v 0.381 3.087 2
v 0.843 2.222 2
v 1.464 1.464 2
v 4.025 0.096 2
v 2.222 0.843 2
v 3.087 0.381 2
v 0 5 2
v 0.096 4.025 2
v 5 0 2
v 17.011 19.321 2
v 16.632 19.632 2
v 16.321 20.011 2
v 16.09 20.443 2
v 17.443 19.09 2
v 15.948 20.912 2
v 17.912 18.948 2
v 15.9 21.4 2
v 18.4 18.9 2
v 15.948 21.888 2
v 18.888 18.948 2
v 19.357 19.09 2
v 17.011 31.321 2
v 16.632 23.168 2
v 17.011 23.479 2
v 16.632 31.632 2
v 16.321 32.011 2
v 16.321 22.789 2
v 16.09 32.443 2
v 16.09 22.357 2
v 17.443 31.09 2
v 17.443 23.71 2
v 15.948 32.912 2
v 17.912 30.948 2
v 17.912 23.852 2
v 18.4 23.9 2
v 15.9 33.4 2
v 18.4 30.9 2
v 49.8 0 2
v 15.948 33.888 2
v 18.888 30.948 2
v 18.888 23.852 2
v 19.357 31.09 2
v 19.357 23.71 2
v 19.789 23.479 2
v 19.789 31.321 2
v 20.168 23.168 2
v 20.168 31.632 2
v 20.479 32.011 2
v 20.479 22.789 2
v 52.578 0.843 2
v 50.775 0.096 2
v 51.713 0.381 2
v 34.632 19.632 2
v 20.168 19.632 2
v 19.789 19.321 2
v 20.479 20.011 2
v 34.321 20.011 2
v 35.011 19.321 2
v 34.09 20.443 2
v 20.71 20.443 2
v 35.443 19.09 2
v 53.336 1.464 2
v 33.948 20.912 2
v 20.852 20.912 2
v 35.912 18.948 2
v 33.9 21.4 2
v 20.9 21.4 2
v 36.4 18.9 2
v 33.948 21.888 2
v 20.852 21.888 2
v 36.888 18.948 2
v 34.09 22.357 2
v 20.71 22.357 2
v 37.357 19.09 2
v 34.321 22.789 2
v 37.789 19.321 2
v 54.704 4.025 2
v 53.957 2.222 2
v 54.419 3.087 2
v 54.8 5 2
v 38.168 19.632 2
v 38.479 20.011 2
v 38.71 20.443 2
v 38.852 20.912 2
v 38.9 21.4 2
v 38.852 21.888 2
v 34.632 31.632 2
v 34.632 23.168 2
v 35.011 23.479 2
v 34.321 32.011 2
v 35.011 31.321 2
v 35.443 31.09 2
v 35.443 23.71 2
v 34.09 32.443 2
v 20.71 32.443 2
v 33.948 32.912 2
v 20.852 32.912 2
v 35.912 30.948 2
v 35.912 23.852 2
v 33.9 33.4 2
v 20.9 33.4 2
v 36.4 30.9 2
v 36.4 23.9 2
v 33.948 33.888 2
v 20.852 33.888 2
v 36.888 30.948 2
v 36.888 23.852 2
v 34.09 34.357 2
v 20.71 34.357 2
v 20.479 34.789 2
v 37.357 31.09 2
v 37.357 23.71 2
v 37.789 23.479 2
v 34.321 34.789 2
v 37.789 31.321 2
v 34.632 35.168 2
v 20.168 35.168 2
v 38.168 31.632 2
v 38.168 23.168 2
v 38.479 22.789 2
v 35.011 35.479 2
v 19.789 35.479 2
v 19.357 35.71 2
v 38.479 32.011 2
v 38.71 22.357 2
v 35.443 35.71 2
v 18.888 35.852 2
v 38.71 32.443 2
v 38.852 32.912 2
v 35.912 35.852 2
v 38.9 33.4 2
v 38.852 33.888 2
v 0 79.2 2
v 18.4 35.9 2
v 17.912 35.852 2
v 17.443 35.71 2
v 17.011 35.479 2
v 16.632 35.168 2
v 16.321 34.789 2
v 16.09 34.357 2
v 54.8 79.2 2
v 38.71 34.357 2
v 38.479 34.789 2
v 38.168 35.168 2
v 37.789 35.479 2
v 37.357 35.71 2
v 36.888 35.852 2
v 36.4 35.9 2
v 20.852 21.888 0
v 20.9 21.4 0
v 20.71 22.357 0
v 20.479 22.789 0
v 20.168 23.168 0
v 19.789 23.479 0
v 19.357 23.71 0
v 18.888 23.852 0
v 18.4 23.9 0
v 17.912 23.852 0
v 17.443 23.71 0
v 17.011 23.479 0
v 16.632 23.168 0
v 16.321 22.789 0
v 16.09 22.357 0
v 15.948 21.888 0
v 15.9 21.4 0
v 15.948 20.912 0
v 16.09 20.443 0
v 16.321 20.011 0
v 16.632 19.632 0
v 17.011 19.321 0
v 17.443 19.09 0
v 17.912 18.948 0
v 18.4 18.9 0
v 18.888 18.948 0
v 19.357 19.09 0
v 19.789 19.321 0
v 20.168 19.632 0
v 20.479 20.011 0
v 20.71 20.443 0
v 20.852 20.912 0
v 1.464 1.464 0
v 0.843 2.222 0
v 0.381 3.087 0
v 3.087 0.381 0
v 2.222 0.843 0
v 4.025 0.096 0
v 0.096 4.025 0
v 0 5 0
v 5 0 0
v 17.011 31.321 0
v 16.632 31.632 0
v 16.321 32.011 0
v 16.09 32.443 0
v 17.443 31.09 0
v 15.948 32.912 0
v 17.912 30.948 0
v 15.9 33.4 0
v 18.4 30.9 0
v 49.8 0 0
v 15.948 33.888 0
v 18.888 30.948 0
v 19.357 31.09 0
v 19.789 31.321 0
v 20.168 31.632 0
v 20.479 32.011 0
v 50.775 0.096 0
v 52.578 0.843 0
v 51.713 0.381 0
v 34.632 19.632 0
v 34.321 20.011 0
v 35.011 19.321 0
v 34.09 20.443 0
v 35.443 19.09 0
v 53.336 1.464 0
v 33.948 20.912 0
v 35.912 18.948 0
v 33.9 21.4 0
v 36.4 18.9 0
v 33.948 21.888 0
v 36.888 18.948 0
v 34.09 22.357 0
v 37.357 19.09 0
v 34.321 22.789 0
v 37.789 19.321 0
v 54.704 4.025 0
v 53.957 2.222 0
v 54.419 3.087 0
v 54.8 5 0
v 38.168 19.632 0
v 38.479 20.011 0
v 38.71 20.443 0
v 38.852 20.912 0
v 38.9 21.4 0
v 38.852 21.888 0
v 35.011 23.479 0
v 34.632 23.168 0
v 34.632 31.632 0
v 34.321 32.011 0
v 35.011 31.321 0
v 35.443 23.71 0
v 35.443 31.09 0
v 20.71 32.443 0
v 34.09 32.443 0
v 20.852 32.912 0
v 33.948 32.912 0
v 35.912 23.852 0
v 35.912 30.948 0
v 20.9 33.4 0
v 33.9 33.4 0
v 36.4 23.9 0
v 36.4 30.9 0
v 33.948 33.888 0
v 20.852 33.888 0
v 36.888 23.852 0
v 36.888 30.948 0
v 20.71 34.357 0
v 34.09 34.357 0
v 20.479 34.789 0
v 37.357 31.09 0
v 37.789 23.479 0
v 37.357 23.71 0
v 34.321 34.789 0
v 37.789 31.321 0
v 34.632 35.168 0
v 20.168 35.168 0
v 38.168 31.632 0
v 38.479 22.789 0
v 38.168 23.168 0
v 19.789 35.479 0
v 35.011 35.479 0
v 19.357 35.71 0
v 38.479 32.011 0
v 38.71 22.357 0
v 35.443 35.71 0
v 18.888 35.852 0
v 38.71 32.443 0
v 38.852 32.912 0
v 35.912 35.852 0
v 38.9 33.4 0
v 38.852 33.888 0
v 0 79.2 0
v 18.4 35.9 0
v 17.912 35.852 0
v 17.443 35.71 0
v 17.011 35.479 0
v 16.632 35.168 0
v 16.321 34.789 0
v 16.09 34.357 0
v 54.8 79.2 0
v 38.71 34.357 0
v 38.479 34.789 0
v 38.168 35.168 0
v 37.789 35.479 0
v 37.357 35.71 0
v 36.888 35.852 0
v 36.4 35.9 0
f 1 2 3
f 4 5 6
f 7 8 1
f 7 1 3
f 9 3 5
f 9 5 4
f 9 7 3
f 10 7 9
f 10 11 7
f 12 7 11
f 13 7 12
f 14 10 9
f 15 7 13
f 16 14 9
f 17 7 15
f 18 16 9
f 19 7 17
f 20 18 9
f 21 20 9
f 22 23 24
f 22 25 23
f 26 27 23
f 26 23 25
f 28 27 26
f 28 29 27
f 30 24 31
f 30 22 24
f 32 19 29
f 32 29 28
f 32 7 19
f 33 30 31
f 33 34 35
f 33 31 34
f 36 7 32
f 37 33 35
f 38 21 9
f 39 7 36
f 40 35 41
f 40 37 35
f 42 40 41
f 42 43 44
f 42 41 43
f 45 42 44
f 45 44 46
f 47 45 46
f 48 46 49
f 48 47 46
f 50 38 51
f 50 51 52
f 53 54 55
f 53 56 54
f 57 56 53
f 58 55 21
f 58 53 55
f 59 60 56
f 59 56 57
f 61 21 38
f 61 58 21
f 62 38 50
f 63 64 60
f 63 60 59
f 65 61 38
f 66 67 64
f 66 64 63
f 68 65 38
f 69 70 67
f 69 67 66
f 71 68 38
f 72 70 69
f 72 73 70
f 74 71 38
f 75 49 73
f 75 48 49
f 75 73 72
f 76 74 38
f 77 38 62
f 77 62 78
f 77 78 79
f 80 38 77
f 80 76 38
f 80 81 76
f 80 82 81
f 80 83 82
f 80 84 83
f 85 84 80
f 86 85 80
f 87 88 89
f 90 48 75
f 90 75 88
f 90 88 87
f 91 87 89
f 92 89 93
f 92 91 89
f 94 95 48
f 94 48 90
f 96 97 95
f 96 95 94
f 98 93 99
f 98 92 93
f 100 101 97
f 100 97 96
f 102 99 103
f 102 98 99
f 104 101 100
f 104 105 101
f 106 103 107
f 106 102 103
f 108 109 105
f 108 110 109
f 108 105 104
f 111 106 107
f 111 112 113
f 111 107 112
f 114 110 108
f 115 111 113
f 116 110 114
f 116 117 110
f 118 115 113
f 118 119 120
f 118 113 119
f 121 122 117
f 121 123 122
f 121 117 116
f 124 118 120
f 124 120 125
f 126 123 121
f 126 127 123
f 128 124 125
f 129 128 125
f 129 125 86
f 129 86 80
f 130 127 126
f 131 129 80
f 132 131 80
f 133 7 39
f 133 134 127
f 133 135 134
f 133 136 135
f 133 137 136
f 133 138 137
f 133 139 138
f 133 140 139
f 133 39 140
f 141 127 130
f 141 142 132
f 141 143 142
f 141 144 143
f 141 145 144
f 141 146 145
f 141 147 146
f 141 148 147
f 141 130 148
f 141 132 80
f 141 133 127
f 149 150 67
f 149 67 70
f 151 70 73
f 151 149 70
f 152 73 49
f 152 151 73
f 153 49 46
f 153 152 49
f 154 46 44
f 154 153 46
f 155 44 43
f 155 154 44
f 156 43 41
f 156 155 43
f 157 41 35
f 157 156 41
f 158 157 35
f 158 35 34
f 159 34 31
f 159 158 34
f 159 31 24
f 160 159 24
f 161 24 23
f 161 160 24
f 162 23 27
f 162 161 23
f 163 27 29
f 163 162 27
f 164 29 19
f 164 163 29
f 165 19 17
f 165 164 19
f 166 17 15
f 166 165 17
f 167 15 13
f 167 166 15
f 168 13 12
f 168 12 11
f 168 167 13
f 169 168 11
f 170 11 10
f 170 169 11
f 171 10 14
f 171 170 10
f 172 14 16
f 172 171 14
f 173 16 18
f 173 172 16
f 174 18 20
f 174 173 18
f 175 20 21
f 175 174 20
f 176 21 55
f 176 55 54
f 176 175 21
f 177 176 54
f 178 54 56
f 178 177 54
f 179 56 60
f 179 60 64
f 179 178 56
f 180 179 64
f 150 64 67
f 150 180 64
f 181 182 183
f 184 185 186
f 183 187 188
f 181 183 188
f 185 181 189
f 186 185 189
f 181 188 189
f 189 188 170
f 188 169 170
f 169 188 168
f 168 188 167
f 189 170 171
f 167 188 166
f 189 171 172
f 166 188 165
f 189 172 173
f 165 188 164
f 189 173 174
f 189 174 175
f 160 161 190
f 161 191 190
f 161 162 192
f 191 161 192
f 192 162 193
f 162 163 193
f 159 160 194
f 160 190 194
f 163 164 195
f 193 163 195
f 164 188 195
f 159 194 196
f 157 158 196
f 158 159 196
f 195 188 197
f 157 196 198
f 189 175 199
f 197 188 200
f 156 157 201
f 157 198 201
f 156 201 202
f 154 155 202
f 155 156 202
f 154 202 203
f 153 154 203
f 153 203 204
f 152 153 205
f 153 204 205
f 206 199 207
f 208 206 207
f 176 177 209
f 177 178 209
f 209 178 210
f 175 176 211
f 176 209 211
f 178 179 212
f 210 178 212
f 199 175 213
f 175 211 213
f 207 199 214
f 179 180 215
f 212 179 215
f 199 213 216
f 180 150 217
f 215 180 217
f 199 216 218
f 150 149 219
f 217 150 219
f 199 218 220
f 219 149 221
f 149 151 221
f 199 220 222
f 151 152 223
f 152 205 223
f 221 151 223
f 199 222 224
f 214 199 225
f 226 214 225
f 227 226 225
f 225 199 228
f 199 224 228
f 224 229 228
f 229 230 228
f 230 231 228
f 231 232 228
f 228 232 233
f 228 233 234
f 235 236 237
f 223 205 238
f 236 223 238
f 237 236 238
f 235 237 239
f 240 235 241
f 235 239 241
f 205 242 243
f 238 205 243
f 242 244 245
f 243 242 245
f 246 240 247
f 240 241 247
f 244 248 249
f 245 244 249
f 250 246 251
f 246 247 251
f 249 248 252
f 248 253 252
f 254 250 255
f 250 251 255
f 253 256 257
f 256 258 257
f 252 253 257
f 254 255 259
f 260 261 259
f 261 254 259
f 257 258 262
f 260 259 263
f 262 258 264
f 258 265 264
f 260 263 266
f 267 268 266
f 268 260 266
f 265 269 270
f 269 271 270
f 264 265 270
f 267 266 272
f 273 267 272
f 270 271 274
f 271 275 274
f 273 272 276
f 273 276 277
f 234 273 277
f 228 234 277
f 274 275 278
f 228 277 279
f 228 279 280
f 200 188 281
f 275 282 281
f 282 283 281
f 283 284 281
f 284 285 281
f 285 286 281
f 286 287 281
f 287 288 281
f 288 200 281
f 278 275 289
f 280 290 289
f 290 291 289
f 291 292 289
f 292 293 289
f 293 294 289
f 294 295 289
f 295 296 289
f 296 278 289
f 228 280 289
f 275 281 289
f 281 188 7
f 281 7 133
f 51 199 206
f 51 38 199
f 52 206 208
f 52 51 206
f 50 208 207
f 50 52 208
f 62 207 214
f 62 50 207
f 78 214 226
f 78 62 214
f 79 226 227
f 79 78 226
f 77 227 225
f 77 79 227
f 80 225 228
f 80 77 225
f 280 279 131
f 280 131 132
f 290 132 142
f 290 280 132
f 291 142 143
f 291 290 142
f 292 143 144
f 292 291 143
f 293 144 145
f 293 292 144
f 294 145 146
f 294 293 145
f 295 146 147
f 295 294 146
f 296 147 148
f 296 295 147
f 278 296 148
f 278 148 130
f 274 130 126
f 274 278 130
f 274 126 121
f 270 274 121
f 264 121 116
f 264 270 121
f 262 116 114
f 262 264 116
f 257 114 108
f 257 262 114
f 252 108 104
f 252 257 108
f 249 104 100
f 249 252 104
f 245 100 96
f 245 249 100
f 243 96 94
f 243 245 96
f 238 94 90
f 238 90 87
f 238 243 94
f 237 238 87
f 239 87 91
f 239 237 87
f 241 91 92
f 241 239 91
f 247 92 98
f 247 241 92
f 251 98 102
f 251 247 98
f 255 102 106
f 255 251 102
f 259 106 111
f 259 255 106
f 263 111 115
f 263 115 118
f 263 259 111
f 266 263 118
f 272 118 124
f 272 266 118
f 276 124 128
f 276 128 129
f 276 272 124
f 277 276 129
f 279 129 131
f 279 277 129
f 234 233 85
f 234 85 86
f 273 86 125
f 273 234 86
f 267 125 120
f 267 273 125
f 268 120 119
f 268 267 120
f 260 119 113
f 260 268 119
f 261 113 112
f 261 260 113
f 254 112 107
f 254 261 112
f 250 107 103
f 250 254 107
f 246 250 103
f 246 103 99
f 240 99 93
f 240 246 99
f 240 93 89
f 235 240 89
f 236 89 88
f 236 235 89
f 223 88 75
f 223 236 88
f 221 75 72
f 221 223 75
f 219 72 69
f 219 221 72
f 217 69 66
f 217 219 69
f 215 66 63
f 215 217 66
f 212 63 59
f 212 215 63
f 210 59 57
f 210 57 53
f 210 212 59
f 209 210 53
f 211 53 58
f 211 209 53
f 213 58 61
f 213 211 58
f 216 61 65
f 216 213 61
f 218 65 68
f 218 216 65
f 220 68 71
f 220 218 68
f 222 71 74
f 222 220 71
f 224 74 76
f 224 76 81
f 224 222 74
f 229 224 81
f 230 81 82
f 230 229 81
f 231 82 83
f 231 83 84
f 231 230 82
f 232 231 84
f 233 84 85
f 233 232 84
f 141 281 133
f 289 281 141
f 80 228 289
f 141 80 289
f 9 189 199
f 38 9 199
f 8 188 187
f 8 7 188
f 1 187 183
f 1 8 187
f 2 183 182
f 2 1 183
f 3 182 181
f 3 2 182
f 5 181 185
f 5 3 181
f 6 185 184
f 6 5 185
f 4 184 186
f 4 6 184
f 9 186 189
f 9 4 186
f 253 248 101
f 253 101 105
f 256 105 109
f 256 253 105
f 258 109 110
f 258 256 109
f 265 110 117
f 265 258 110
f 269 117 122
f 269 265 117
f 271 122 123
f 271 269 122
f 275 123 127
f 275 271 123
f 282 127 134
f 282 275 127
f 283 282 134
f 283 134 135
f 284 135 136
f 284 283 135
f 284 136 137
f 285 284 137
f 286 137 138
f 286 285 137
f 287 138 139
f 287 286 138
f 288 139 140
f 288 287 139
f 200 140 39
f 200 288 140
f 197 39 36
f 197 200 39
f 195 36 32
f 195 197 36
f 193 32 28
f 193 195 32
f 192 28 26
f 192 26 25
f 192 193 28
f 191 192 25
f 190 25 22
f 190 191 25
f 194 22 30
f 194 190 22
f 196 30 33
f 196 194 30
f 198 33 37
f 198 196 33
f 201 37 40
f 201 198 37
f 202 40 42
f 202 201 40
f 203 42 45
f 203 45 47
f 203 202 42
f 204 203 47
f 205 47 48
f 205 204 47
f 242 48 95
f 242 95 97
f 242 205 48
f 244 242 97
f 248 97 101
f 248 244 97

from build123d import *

# Parameters (mm, degrees)
F0_W     = 54.8
F0_H     = 79.2
F0_R     = 2.5
F1_DEPTH = 2
F2_R     = 5


with BuildPart() as f1:
    # F0 (on Top) → F1 (new body)
    with BuildSketch(Plane.XY):
        with Locations((27.4, 39.6)):
            Rectangle(F0_W, F0_H)
        with Locations((18.4, 21.4)):
            Circle(F0_R, mode=Mode.SUBTRACT)
        with Locations((18.4, 33.4)):
            Circle(F0_R, mode=Mode.SUBTRACT)
        with Locations((36.4, 21.4)):
            Circle(F0_R, mode=Mode.SUBTRACT)
        with Locations((36.4, 33.4)):
            Circle(F0_R, mode=Mode.SUBTRACT)
    extrude(amount=F1_DEPTH)

    # F2
    f2_edges = [f1.edges().sort_by_distance(p)[0] for p in [
        (54.8, 0, 1),
        (0, 0, 1),
    ]]
    fillet(f2_edges, radius=F2_R)


solid = f1.part
